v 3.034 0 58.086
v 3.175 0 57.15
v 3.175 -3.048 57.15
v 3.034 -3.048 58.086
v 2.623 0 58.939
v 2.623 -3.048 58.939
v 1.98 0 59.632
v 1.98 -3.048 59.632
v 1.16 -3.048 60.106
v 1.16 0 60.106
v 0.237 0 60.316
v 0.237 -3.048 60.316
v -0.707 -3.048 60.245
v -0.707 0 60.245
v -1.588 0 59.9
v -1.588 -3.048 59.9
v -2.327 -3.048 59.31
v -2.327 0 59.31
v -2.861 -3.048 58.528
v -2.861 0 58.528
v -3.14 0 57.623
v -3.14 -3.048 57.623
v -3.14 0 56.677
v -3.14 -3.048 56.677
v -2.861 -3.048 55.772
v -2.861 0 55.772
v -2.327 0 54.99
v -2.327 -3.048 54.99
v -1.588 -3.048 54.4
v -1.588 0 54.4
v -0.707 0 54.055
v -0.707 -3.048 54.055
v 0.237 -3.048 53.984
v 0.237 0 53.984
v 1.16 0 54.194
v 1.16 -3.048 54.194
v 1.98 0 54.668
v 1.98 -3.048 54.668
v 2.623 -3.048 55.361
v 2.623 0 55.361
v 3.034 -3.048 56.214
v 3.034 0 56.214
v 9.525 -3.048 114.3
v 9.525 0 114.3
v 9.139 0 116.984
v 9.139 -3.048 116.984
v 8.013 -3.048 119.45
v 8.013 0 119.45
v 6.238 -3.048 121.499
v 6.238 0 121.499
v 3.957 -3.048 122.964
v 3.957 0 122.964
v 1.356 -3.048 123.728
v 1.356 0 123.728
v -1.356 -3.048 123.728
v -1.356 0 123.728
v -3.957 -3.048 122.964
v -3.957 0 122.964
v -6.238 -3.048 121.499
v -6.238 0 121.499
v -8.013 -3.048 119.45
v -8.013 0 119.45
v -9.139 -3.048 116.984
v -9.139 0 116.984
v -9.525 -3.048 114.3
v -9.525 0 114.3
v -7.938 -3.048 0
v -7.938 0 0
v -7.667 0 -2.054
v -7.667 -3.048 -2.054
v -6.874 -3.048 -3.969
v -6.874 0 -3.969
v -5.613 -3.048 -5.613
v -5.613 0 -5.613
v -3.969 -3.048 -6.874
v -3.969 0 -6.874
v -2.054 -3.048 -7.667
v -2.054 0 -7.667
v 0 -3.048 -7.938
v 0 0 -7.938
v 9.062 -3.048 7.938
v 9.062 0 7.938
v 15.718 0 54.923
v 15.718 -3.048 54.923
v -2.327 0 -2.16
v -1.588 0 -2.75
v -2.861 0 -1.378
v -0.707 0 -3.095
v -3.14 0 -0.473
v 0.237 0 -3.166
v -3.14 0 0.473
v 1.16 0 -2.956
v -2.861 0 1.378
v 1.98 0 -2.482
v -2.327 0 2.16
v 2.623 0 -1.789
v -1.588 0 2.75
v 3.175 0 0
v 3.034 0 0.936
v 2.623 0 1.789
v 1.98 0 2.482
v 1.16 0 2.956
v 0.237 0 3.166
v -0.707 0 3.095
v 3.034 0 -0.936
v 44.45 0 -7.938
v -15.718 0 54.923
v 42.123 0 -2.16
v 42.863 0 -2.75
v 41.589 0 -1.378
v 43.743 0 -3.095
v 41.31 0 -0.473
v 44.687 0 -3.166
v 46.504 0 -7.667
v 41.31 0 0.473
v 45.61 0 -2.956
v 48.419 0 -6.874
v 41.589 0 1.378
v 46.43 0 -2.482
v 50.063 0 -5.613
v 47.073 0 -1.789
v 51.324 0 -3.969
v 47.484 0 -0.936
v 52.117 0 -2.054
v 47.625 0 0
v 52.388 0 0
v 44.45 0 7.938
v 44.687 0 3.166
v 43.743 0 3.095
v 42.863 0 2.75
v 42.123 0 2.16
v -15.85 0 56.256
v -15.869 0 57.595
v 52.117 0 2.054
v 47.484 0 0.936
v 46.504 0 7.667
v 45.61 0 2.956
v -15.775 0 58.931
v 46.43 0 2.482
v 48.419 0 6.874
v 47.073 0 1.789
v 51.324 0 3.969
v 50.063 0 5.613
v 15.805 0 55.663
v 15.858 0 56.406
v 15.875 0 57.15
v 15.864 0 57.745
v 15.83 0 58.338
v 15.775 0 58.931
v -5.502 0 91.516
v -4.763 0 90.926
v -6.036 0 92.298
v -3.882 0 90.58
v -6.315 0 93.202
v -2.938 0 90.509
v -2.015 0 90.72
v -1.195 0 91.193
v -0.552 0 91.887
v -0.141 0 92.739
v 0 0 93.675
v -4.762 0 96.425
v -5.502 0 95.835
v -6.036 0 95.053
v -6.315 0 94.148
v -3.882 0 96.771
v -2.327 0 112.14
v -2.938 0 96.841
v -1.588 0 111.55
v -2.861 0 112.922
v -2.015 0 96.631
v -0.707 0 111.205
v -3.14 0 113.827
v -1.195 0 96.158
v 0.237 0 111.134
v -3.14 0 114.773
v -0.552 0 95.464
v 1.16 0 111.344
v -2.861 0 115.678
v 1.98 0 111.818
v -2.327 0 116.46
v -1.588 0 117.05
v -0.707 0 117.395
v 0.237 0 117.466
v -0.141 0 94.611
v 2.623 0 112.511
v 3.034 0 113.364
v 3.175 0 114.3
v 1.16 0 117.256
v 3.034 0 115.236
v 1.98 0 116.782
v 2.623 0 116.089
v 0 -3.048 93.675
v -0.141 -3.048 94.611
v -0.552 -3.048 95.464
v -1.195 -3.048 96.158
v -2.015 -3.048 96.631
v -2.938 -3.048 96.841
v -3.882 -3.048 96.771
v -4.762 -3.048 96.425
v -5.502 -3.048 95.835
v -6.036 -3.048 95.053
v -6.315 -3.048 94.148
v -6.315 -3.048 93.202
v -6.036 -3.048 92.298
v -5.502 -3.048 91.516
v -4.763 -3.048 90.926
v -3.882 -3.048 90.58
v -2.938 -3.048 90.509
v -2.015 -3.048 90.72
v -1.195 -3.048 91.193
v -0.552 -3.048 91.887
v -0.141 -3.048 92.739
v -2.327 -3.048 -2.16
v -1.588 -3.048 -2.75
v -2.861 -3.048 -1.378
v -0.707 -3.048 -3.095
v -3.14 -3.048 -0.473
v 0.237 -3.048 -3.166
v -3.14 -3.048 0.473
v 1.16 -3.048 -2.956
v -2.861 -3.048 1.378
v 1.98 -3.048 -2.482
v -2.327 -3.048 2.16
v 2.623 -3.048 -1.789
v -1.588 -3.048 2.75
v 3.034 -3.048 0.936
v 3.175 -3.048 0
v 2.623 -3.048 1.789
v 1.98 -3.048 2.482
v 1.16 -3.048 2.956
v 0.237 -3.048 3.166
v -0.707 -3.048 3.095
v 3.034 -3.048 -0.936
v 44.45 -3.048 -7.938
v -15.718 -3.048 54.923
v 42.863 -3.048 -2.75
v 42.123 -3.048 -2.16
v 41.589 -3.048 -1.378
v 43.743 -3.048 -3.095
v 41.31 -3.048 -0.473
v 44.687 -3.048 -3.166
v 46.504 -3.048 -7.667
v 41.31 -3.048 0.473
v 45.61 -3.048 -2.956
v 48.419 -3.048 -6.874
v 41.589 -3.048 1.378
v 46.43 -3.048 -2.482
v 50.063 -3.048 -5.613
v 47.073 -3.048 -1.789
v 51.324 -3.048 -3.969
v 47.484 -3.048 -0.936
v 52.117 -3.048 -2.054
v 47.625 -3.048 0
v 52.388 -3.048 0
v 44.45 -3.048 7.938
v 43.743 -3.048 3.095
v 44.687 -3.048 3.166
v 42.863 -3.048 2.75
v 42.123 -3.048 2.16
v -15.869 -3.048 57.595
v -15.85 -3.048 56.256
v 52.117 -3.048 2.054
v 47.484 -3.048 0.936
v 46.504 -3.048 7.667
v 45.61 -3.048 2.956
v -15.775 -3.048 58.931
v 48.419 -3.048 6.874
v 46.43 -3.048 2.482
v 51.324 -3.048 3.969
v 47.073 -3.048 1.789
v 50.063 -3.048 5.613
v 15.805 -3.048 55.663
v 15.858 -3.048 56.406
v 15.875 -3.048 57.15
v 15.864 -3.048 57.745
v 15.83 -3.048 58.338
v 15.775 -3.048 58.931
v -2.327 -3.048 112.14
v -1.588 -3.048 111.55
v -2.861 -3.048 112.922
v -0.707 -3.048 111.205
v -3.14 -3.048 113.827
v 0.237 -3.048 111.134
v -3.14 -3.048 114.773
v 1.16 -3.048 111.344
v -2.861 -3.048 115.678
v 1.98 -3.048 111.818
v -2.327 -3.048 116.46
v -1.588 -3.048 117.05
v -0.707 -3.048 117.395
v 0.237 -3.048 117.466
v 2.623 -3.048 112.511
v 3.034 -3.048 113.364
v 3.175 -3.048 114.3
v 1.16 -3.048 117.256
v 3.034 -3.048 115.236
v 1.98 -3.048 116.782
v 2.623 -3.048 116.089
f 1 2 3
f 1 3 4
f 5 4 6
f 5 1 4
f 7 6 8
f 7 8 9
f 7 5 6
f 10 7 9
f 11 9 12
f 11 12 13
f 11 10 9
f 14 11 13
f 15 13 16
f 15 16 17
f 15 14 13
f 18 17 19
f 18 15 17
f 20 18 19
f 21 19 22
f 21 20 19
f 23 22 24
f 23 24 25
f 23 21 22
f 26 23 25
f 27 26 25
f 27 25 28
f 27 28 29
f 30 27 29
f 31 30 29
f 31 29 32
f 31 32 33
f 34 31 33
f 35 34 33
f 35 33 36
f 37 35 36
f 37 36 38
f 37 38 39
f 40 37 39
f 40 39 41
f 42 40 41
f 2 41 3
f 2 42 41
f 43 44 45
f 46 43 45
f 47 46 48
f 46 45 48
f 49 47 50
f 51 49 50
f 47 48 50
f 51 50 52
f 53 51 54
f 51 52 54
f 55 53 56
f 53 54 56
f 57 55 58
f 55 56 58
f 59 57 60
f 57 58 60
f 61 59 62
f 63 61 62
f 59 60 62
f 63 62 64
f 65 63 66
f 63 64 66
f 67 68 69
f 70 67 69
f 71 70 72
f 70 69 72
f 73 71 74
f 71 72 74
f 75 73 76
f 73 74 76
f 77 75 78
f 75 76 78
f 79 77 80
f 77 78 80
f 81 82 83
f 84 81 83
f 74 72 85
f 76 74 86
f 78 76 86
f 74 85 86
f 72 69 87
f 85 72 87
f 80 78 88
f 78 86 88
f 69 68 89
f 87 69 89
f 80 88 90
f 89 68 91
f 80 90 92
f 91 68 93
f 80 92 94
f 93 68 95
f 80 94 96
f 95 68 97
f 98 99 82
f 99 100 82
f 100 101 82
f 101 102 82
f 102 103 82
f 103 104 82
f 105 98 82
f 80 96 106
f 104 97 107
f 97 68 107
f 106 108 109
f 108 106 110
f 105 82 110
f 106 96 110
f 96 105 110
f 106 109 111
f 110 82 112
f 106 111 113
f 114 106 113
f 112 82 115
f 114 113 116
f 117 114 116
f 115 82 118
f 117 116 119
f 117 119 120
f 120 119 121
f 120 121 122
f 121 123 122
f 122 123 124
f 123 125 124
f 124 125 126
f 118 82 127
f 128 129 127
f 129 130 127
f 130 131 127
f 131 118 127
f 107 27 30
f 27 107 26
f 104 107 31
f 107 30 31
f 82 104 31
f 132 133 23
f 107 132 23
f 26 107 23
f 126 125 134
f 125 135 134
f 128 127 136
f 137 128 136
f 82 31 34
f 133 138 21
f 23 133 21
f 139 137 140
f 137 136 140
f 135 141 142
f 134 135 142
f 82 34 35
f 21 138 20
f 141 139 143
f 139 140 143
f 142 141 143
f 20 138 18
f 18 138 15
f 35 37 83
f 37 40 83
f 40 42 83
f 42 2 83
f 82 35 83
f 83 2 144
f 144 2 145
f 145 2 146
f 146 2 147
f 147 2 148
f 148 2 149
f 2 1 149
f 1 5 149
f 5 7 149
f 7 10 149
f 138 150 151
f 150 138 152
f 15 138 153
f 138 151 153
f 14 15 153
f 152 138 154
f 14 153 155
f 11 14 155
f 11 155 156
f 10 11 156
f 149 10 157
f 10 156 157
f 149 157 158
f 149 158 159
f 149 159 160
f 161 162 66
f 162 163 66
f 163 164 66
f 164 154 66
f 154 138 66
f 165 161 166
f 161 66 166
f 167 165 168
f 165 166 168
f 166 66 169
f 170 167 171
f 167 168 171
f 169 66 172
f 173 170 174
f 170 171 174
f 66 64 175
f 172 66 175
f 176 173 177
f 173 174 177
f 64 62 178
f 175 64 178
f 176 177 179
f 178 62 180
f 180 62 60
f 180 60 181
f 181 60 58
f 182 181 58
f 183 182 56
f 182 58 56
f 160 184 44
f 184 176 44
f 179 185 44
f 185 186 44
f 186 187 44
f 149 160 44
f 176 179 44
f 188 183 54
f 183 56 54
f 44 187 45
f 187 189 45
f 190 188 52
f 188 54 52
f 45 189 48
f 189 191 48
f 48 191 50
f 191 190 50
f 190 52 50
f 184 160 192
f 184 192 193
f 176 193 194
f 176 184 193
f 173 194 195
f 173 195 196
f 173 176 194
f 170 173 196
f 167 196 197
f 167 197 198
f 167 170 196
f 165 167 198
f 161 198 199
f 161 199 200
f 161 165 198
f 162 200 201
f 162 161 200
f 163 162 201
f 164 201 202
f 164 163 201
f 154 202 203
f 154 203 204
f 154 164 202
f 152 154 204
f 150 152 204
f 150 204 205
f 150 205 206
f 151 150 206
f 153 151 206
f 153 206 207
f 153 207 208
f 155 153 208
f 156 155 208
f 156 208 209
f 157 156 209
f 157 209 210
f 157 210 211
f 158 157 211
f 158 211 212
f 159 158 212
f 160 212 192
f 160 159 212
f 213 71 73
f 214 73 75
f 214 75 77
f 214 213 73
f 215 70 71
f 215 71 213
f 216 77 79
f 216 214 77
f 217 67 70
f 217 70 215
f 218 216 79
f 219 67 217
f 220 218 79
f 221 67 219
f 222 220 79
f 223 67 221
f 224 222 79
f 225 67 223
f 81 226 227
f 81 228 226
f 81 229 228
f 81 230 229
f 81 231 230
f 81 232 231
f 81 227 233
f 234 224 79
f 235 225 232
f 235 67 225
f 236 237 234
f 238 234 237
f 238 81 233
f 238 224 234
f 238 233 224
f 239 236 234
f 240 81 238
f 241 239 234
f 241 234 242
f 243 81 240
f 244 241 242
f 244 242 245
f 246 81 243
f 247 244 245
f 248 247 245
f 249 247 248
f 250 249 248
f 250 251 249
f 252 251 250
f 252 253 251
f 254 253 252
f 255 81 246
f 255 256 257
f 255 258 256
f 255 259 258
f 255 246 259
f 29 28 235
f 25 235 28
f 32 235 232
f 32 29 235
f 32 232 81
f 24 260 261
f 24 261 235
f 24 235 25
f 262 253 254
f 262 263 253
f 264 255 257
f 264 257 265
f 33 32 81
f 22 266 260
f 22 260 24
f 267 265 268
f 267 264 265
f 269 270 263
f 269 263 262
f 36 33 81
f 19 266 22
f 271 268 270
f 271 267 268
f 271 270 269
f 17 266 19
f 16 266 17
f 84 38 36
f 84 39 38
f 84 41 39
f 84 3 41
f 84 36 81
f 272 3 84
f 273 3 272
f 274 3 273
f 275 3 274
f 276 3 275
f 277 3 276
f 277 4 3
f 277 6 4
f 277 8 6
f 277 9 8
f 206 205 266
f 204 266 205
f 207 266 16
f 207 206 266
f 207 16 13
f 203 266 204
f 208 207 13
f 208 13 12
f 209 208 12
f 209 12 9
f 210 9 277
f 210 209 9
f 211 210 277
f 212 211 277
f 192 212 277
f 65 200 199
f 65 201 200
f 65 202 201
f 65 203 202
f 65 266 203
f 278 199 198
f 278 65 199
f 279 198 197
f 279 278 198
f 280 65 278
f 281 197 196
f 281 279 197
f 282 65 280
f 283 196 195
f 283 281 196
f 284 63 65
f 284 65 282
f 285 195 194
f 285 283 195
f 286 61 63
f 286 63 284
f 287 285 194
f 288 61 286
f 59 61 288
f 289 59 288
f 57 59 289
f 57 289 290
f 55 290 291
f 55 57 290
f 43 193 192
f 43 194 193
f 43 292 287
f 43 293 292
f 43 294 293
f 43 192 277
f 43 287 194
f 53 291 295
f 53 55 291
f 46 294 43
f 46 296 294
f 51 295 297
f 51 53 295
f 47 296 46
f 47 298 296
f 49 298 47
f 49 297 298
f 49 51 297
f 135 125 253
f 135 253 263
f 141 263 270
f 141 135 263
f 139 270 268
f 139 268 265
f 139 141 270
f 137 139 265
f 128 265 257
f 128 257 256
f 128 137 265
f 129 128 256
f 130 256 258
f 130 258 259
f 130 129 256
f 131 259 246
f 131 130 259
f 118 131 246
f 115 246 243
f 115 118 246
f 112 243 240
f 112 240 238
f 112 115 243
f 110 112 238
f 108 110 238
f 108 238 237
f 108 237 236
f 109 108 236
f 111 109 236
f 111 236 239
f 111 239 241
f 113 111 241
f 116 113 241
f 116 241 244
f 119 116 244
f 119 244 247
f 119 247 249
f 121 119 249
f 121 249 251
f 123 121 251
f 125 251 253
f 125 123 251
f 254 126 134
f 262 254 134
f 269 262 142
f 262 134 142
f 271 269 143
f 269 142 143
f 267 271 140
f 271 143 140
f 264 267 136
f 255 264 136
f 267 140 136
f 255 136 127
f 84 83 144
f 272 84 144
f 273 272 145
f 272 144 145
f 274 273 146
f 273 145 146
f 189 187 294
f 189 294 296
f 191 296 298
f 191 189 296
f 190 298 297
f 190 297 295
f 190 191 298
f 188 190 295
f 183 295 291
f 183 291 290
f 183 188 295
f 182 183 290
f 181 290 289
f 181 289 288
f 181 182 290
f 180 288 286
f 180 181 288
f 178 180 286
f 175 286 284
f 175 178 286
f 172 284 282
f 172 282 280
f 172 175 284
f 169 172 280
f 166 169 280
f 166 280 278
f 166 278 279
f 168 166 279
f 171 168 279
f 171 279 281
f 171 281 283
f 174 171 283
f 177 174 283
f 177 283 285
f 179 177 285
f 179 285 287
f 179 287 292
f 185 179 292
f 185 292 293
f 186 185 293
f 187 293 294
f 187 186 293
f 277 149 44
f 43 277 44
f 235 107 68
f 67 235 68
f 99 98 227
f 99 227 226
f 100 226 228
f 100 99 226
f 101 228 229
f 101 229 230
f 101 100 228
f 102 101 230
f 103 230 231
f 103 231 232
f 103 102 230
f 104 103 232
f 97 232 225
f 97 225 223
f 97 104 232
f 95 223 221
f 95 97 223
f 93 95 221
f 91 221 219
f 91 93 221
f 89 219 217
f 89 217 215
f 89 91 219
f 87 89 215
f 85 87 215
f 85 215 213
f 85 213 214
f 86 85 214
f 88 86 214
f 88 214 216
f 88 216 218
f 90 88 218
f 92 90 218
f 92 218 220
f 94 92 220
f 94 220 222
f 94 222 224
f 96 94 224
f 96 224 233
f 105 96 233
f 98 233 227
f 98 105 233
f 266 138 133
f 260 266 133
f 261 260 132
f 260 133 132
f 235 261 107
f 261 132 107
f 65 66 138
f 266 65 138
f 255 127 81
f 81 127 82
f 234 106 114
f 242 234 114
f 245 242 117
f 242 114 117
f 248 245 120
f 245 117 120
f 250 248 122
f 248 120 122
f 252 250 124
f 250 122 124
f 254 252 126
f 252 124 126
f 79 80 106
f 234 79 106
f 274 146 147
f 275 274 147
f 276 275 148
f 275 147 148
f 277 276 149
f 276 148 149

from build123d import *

# Parameters (mm, degrees)
F0_R     = 3.175
F1_DEPTH = 3.048


with BuildPart() as f1:
    # F0 (on Front) → F1 (new body)
    with BuildSketch(Plane.XZ):
        with BuildLine():
            ThreePointArc((-9.525, 114.3), (0, 104.775), (9.525, 114.3))
            ThreePointArc((9.525, 114.3), (0, 123.825), (-9.525, 114.3))
        make_face()
        with Locations((0, 114.3)):
            Circle(F0_R, mode=Mode.SUBTRACT)
        with BuildLine():
            Line((15.7748262685, 58.9305845108), (9.525, 114.3))
            ThreePointArc((9.525, 114.3), (0, 104.775), (-9.525, 114.3))
            Line((-9.525, 114.3), (-15.7748262685, 58.9305845108))
            ThreePointArc((-15.7748262685, 58.9305845108), (0, 73.025), (15.7748262685, 58.9305845108))
        make_face()
        with Locations((-3.175, 93.6752)):
            Circle(F0_R, mode=Mode.SUBTRACT)
        with BuildLine():
            ThreePointArc((15.875, 57.15), (15.8499367824, 58.0417000584), (15.7748262685, 58.9305845108))
            ThreePointArc((15.7748262685, 58.9305845108), (0, 73.025), (-15.7748262685, 58.9305845108))
            ThreePointArc((-15.7748262685, 58.9305845108), (-15.8734077732, 56.9251652464), (-15.7180667333, 54.9233426018))
            ThreePointArc((-15.7180667333, 54.9233426018), (0, 41.275), (15.7180667333, 54.9233426018))
            ThreePointArc((15.7180667333, 54.9233426018), (15.8357180827, 56.0339095893), (15.875, 57.15))
        make_face()
        with Locations((0, 57.15)):
            Circle(F0_R, mode=Mode.SUBTRACT)
        with BuildLine():
            ThreePointArc((15.7180667333, 54.9233426018), (0, 41.275), (-15.7180667333, 54.9233426018))
            Line((-15.7180667333, 54.9233426018), (-7.9375, 0))
            ThreePointArc((-7.9375, 0), (-5.6126600757, 5.6126600757), (0, 7.9375))
            Line((0, 7.9375), (9.0619444624, 7.9375))
            Line((9.0619444624, 7.9375), (15.7180667333, 54.9233426018))
        make_face()
        with BuildLine():
            ThreePointArc((0, 7.9375), (-5.6126600757, 5.6126600757), (-7.9375, 0))
            ThreePointArc((-7.9375, 0), (-5.6126600757, -5.6126600757), (0, -7.9375))
            ThreePointArc((0, -7.9375), (5.6126600757, -5.6126600757), (7.9375, 0))
            ThreePointArc((7.9375, 0), (5.6126600757, 5.6126600757), (0, 7.9375))
        make_face()
        Circle(F0_R, mode=Mode.SUBTRACT)
        with BuildLine():
            Line((44.45, 7.9375), (9.0619444624, 7.9375))
            Line((9.0619444624, 7.9375), (7.9375, 0))
            ThreePointArc((7.9375, 0), (5.6126600757, -5.6126600757), (0, -7.9375))
            Line((0, -7.9375), (44.45, -7.9375))
            ThreePointArc((44.45, -7.9375), (36.5125, 0), (44.45, 7.9375))
        make_face()
        with BuildLine():
            Line((7.9375, 0), (9.0619444624, 7.9375))
            Line((9.0619444624, 7.9375), (0, 7.9375))
            ThreePointArc((0, 7.9375), (5.6126600757, 5.6126600757), (7.9375, 0))
        make_face()
        with BuildLine():
            ThreePointArc((52.3875, 0), (50.0626600757, 5.6126600757), (44.45, 7.9375))
            ThreePointArc((44.45, 7.9375), (36.5125, 0), (44.45, -7.9375))
            ThreePointArc((44.45, -7.9375), (50.0626600757, -5.6126600757), (52.3875, 0))
        make_face()
        with Locations((44.45, 0)):
            Circle(F0_R, mode=Mode.SUBTRACT)
    extrude(amount=F1_DEPTH)


solid = f1.part
